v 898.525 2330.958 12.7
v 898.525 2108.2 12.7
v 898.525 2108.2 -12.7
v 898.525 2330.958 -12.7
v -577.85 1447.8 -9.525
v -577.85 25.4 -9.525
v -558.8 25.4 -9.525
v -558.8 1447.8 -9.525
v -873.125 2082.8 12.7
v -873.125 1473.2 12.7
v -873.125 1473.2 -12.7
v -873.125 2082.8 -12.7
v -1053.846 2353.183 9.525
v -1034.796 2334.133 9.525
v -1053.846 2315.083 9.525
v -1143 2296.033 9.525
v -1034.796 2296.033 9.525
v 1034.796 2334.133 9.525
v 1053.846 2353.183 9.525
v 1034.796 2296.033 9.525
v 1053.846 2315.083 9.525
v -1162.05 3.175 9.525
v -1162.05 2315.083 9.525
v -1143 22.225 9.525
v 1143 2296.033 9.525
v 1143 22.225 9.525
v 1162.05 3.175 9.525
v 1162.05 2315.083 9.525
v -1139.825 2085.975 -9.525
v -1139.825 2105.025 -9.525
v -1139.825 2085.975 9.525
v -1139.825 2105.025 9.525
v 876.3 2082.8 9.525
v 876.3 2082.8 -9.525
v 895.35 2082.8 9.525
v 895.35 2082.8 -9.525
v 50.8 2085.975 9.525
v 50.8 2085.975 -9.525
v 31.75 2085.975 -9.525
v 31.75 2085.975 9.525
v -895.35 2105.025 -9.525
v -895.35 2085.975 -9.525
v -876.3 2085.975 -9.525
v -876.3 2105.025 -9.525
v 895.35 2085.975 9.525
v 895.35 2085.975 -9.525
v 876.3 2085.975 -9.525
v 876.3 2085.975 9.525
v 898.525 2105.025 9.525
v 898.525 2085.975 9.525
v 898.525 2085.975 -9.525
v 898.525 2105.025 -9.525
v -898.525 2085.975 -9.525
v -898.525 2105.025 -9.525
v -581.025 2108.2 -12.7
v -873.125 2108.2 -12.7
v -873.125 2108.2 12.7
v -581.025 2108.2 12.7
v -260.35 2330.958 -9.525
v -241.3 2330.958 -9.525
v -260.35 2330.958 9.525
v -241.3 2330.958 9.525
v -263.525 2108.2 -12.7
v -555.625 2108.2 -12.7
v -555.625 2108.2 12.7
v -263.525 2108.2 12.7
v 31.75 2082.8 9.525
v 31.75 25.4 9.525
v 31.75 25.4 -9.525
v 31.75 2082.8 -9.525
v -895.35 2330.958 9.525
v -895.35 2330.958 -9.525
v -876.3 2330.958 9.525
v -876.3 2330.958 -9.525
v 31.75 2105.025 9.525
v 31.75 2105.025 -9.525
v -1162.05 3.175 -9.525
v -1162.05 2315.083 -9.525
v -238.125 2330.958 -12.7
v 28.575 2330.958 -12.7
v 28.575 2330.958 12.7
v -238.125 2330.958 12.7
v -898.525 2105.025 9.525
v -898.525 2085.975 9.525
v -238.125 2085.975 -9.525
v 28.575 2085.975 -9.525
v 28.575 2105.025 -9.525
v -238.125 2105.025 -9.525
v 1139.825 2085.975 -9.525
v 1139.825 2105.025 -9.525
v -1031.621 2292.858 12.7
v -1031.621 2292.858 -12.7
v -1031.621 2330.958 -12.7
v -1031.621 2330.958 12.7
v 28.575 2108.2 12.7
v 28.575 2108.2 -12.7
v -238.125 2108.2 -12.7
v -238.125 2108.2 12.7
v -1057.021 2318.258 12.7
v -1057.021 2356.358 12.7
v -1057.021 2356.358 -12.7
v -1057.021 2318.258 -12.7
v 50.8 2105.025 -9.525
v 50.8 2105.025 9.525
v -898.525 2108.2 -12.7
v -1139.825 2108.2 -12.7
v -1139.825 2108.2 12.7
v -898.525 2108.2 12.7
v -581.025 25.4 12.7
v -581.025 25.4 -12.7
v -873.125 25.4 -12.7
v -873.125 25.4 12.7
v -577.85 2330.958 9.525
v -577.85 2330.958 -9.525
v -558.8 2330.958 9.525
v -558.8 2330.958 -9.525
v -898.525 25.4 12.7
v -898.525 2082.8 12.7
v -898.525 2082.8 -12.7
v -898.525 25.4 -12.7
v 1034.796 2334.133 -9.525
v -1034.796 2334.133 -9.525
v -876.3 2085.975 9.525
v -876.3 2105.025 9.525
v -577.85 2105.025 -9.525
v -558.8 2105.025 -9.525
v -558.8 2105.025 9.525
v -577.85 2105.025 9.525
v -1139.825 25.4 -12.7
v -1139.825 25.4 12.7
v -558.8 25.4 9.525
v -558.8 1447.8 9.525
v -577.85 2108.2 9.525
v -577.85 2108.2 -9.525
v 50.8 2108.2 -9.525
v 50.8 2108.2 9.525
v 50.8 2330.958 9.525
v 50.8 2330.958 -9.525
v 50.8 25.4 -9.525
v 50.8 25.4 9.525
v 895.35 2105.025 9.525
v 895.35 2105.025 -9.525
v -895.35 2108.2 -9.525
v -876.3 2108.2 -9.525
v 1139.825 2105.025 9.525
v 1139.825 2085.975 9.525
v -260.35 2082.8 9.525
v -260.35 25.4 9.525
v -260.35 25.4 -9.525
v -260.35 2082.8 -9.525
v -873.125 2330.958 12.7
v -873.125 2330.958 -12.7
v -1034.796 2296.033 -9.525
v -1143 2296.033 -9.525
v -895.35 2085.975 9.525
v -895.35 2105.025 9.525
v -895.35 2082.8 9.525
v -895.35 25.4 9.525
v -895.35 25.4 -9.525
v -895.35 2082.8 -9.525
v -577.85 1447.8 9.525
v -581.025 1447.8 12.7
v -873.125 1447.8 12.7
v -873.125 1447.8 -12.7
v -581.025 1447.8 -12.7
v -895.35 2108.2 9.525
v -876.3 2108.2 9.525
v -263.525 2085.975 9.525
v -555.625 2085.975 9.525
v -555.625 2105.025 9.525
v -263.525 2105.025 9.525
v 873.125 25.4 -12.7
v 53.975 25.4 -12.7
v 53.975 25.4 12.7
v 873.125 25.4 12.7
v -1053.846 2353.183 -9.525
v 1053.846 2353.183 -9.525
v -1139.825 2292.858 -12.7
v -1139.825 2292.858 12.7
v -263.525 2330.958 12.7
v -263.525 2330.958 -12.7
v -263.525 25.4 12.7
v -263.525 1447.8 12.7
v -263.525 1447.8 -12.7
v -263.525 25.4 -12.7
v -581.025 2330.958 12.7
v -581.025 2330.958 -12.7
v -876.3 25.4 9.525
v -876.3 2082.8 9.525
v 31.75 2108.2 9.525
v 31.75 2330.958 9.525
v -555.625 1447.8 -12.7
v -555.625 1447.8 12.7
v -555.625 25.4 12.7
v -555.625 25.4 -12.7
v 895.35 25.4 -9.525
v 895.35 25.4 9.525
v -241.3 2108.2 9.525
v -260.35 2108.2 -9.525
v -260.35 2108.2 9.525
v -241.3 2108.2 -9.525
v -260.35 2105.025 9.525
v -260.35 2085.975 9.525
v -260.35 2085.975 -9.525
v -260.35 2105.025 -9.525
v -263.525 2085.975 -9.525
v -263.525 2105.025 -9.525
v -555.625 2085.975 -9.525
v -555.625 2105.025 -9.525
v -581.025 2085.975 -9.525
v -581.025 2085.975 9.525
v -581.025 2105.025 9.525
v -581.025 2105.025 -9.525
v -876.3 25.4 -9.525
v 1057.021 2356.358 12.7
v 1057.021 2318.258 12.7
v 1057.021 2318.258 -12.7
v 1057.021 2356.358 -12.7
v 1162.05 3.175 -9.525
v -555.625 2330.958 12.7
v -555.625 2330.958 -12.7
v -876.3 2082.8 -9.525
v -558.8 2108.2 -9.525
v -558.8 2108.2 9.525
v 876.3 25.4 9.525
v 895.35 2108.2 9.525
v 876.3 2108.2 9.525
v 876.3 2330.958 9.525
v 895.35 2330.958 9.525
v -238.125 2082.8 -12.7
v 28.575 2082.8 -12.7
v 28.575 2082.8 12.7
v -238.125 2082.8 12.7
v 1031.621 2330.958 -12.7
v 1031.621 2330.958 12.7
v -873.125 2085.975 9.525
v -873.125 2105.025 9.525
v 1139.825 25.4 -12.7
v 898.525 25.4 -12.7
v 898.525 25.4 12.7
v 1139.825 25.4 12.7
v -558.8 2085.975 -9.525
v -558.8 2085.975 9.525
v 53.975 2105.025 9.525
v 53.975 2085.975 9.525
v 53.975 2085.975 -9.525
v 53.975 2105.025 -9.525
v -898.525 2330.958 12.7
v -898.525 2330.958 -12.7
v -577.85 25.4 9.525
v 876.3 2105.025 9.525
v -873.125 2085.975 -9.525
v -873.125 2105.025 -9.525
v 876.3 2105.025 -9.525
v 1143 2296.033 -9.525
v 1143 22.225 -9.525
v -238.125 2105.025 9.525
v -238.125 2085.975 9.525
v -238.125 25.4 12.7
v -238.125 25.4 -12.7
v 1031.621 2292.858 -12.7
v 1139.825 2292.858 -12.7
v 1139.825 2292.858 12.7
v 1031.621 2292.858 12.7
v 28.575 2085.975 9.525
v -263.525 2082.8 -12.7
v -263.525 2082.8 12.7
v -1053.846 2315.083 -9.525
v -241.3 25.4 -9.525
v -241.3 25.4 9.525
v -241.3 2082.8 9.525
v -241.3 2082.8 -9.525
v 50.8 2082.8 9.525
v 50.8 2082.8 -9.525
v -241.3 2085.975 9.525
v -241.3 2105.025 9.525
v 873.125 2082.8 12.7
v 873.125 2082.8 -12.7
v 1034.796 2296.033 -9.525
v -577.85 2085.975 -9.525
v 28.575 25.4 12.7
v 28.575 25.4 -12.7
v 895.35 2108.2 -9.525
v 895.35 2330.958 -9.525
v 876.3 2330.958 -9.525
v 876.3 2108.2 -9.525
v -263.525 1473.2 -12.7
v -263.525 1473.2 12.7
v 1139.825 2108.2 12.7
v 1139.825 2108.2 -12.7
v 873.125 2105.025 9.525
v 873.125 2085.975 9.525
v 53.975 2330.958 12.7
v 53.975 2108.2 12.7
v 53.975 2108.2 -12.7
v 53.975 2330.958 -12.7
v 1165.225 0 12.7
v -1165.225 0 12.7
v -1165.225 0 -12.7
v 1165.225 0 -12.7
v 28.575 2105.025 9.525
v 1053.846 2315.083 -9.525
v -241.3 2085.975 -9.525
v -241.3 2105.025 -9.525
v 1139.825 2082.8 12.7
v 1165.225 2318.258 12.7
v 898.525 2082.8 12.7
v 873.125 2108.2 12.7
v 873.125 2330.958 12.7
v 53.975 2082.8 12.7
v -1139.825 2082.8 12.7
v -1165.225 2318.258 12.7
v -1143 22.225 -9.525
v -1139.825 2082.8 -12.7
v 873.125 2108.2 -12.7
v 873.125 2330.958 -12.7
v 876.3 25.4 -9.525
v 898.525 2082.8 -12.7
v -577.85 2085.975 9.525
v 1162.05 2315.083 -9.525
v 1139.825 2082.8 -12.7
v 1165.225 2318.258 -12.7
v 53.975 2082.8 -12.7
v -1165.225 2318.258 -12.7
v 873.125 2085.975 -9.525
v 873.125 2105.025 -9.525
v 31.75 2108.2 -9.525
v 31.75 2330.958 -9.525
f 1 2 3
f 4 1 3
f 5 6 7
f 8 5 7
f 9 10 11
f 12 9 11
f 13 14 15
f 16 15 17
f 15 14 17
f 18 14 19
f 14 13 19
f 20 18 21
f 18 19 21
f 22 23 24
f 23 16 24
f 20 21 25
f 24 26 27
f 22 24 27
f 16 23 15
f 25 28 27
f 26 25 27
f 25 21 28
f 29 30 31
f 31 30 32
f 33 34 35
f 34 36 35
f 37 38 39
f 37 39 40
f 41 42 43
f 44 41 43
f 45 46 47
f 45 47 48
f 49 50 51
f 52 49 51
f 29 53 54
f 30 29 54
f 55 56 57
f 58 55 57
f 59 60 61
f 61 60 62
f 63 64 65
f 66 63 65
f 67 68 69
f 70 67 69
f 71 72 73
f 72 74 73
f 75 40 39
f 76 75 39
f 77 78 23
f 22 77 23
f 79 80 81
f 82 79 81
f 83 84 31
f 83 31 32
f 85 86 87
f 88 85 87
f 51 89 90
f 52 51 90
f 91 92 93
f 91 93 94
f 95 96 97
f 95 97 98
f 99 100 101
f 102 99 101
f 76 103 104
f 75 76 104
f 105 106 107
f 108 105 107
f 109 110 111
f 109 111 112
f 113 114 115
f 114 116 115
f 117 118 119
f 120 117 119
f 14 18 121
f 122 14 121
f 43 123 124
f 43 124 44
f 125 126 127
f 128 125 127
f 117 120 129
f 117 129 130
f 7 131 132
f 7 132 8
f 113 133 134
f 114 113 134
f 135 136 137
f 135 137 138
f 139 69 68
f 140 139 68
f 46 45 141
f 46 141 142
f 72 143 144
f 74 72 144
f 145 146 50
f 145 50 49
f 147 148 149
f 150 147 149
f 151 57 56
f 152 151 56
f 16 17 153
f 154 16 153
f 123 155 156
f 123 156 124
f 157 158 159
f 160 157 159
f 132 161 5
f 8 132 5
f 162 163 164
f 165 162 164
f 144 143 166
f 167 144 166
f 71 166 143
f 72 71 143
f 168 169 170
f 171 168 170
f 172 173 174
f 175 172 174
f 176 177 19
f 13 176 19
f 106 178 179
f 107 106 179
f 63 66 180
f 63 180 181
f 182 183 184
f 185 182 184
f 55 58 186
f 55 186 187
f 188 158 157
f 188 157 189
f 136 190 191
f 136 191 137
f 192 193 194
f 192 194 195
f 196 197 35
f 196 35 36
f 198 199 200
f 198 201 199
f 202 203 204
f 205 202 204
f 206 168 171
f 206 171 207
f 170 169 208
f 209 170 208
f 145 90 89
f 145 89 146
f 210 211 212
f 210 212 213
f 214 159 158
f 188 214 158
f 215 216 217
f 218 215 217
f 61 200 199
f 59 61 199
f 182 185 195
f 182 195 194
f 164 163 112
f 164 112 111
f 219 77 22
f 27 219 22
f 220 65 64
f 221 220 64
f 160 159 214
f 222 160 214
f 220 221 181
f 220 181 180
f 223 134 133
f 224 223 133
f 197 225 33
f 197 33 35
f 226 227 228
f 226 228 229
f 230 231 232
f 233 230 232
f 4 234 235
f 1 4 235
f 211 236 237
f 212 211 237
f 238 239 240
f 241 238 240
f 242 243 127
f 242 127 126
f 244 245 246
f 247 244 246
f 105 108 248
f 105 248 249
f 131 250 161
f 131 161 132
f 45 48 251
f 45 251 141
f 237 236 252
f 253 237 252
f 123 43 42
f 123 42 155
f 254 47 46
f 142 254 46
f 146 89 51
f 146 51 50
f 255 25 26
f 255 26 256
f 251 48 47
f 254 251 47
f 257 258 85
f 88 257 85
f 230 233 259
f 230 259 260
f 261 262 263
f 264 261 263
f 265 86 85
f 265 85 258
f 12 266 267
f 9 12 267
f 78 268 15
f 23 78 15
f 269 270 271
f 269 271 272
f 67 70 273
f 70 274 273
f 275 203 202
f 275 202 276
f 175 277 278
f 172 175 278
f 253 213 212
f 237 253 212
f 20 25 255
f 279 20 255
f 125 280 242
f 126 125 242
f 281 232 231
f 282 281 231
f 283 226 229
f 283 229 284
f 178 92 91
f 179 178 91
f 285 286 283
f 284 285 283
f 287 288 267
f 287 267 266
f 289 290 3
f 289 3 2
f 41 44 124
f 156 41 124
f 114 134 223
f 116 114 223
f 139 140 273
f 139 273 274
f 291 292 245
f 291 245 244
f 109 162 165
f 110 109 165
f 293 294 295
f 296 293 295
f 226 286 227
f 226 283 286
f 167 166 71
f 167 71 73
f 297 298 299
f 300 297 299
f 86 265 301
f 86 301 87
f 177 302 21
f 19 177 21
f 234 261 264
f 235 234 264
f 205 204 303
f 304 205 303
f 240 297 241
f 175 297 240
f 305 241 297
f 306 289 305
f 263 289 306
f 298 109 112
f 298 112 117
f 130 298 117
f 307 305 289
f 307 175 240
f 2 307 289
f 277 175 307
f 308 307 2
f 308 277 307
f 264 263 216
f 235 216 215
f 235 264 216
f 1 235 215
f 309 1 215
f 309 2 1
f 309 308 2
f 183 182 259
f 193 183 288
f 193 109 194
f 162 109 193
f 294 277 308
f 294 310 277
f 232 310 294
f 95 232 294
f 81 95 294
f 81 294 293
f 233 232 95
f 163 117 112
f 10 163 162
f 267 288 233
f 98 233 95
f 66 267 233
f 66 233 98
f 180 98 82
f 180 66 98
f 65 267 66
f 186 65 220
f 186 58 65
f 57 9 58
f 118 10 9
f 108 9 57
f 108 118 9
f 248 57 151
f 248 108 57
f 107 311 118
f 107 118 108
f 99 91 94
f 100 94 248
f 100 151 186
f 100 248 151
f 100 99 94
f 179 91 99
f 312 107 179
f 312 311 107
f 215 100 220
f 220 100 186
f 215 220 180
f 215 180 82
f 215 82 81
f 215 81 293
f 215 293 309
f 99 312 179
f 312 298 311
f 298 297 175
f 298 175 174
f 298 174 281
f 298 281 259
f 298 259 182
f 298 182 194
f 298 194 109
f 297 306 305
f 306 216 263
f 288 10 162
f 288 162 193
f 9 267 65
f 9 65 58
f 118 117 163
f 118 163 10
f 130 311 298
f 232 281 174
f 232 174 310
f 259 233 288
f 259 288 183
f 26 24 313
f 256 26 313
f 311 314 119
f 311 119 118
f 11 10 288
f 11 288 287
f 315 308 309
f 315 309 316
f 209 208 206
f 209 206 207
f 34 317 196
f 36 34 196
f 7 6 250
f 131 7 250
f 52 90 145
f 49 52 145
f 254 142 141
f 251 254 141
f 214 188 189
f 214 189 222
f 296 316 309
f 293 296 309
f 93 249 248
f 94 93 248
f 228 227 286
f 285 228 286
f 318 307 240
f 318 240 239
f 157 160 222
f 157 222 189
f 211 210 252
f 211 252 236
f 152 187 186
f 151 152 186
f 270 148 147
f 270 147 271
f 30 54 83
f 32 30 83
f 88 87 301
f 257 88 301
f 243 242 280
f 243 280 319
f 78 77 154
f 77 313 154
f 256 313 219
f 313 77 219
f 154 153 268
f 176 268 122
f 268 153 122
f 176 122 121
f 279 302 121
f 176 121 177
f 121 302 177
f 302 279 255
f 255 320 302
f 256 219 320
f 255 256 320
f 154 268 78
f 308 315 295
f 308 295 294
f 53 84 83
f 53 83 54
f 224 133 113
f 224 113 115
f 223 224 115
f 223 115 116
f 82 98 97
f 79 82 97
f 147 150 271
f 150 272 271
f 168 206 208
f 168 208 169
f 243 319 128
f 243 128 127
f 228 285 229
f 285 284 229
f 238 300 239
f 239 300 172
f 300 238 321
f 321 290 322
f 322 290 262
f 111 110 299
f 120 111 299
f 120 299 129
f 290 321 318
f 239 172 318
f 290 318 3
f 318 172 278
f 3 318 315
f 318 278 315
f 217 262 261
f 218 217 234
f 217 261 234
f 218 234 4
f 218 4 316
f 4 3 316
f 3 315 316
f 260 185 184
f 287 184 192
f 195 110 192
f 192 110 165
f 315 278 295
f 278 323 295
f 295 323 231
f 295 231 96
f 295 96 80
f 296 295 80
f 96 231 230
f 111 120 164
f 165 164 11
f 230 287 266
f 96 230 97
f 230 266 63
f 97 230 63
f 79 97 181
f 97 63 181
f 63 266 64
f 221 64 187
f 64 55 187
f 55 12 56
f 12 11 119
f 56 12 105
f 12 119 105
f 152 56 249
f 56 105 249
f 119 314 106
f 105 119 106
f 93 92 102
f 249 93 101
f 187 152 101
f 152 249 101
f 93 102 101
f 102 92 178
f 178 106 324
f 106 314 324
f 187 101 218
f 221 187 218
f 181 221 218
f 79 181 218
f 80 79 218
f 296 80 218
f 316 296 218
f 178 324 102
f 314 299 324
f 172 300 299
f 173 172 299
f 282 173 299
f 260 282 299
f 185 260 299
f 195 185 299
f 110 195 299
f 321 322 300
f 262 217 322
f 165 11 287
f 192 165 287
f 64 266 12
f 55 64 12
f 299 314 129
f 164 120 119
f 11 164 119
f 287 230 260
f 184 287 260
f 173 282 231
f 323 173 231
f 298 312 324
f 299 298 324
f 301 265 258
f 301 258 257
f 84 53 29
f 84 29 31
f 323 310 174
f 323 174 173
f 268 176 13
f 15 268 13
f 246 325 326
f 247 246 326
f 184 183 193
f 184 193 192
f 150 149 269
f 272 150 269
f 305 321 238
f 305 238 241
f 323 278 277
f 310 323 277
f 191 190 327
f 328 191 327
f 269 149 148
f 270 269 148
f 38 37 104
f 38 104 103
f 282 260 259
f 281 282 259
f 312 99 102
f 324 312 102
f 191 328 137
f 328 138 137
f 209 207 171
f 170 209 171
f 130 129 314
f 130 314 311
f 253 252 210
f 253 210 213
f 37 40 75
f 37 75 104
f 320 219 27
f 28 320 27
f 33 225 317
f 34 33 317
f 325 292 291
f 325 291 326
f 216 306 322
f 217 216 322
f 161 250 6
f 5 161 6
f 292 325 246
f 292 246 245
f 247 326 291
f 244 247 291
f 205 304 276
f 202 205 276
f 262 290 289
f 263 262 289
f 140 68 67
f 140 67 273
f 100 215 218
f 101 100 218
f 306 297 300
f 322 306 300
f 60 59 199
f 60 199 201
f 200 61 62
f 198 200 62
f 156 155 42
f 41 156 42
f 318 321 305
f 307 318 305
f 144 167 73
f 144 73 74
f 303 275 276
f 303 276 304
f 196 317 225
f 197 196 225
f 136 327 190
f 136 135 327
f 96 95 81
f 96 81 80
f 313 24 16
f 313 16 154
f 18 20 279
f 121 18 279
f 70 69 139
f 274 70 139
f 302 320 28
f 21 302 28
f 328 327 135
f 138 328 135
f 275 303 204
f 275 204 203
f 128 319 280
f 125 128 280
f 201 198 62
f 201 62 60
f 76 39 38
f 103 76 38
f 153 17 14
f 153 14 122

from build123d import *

# Parameters (mm, degrees)
SKETCH2_W             = 25.4
SKETCH2_H             = 25.4
SKETCH2_W_2           = 19.05
SKETCH2_H_2           = 19.05
SKETCH3_W             = 25.4
SKETCH3_H             = 25.4
SKETCH3_W_2           = 19.05
SKETCH3_H_2           = 19.05
BOSS_EXTRUDE1_DEPTH   = 2305.558
BOSS_EXTRUDE1_2_DEPTH = 2305.558
BOSS_EXTRUDE1_3_DEPTH = 2305.558
BOSS_EXTRUDE1_4_DEPTH = 2305.558
BOSS_EXTRUDE1_5_DEPTH = 2305.558
BOSS_EXTRUDE2_START   = -108.204
SKETCH5_W             = 25.4
SKETCH5_H             = 25.4
SKETCH5_W_2           = 19.05
SKETCH5_H_2           = 19.05
BOSS_EXTRUDE2_DEPTH   = 2279.65
CUT_EXTRUDE1_REACH    = 27.4
SKETCH6_W             = 609.6
SKETCH6_H             = 635
SKETCH7_W             = 25.4
SKETCH7_H             = 25.4
BOSS_EXTRUDE3_DEPTH   = 609.6


with BuildPart() as part:
    # Sweep1: sweep along a path in Sketch1
    with BuildLine(Plane.XY) as sweep1_path:
        Line((-1057.021, 2356.358), (1057.021, 2356.358))
        Line((1057.021, 2356.358), (1057.021, 2318.258))
        Line((1057.021, 2318.258), (1165.225, 2318.258))
        Line((1165.225, 2318.258), (1165.225, 0))
        Line((1165.225, 0), (-1165.225, 0))
        Line((-1165.225, 0), (-1165.225, 2318.258))
        Line((-1165.225, 2318.258), (-1057.021, 2318.258))
        Line((-1057.021, 2318.258), (-1057.021, 2356.358))
    # Sketch2 → Sweep1 (sweep)
    with BuildSketch(Plane(origin=(0, 0, 0), x_dir=(0, 0, -1), z_dir=(1, 0, 0))):
        with Locations((0, 12.7)):
            Rectangle(SKETCH2_W, SKETCH2_H)
        with Locations((0, 12.7)):
            Rectangle(SKETCH2_W_2, SKETCH2_H_2, mode=Mode.SUBTRACT)
    sweep(path=sweep1_path.line, transition=Transition.RIGHT)



with BuildPart() as body_2:
    # Sketch3 → Boss-Extrude1 (new body)
    with BuildSketch(Plane(origin=(0, 25.4, 0), x_dir=(1, 0, 0), z_dir=(0, 1, 0))):
        with Locations((885.825, 0)):
            Rectangle(SKETCH3_W, SKETCH3_H)
        with Locations((885.825, 0)):
            Rectangle(SKETCH3_W_2, SKETCH3_H_2, mode=Mode.SUBTRACT)
    extrude(amount=BOSS_EXTRUDE1_DEPTH)


with BuildPart() as body_3:
    # Sketch3 → Boss-Extrude1 2 (new body)
    with BuildSketch(Plane(origin=(0, 25.4, 0), x_dir=(1, 0, 0), z_dir=(0, 1, 0))):
        with Locations((-568.325, 0)):
            Rectangle(SKETCH3_W, SKETCH3_H)
        with Locations((-568.325, 0)):
            Rectangle(SKETCH3_W_2, SKETCH3_H_2, mode=Mode.SUBTRACT)
    extrude(amount=BOSS_EXTRUDE1_2_DEPTH)


with BuildPart() as body_4:
    # Sketch3 → Boss-Extrude1 3 (new body)
    with BuildSketch(Plane(origin=(0, 25.4, 0), x_dir=(1, 0, 0), z_dir=(0, 1, 0))):
        with Locations((-885.825, 0)):
            Rectangle(SKETCH3_W, SKETCH3_H)
        with Locations((-885.825, 0)):
            Rectangle(SKETCH3_W_2, SKETCH3_H_2, mode=Mode.SUBTRACT)
    extrude(amount=BOSS_EXTRUDE1_3_DEPTH)


with BuildPart() as body_5:
    # Sketch3 → Boss-Extrude1 4 (new body)
    with BuildSketch(Plane(origin=(0, 25.4, 0), x_dir=(1, 0, 0), z_dir=(0, 1, 0))):
        with Locations((41.275, 0)):
            Rectangle(SKETCH3_W, SKETCH3_H)
        with Locations((41.275, 0)):
            Rectangle(SKETCH3_W_2, SKETCH3_H_2, mode=Mode.SUBTRACT)
    extrude(amount=BOSS_EXTRUDE1_4_DEPTH)


with BuildPart() as body_6:
    # Sketch3 → Boss-Extrude1 5 (new body)
    with BuildSketch(Plane(origin=(0, 25.4, 0), x_dir=(1, 0, 0), z_dir=(0, 1, 0))):
        with Locations((-250.825, 0)):
            Rectangle(SKETCH3_W, SKETCH3_H)
        with Locations((-250.825, 0)):
            Rectangle(SKETCH3_W_2, SKETCH3_H_2, mode=Mode.SUBTRACT)
    extrude(amount=BOSS_EXTRUDE1_5_DEPTH)


with BuildPart() as part_1:
    add(part.part)

    add(body_2.part)  # Boss-Extrude2 merges body 2

    add(body_3.part)  # Boss-Extrude2 merges body 3

    add(body_4.part)  # Boss-Extrude2 merges body 4

    add(body_5.part)  # Boss-Extrude2 merges body 5

    add(body_6.part)  # Boss-Extrude2 merges body 6
    # Sketch5 → Boss-Extrude2 (add)
    with BuildSketch(Plane.ZY.offset(-1031.621).offset(BOSS_EXTRUDE2_START)):
        with Locations((0, 2095.5)):
            Rectangle(SKETCH5_W, SKETCH5_H)
        with Locations((0, 2095.5)):
            Rectangle(SKETCH5_W_2, SKETCH5_H_2, mode=Mode.SUBTRACT)
    extrude(amount=BOSS_EXTRUDE2_DEPTH)

    # Sketch6 → Cut-Extrude1 (cut, up to next)
    with BuildSketch(Plane.XY.offset(12.7), mode=Mode.PRIVATE) as cut_extrude1_sk1:
        with Locations((-568.325, 1765.3)):
            Rectangle(SKETCH6_W, SKETCH6_H)
    cut_extrude1_tool1 = extrude(cut_extrude1_sk1.sketch, amount=-CUT_EXTRUDE1_REACH, mode=Mode.PRIVATE) & part_1.part
    add(cut_extrude1_tool1.solids().sort_by_distance((-568.325, 1765.3, 12.7))[0], mode=Mode.SUBTRACT)

    # Sketch7 → Boss-Extrude3 (add)
    with BuildSketch(Plane(origin=(-873.125, 0, 0), x_dir=(0, 0, -1), z_dir=(1, 0, 0))):
        with Locations((0, 1460.5)):
            Rectangle(SKETCH7_W, SKETCH7_H)
    extrude(amount=BOSS_EXTRUDE3_DEPTH)


solid = part_1.part
